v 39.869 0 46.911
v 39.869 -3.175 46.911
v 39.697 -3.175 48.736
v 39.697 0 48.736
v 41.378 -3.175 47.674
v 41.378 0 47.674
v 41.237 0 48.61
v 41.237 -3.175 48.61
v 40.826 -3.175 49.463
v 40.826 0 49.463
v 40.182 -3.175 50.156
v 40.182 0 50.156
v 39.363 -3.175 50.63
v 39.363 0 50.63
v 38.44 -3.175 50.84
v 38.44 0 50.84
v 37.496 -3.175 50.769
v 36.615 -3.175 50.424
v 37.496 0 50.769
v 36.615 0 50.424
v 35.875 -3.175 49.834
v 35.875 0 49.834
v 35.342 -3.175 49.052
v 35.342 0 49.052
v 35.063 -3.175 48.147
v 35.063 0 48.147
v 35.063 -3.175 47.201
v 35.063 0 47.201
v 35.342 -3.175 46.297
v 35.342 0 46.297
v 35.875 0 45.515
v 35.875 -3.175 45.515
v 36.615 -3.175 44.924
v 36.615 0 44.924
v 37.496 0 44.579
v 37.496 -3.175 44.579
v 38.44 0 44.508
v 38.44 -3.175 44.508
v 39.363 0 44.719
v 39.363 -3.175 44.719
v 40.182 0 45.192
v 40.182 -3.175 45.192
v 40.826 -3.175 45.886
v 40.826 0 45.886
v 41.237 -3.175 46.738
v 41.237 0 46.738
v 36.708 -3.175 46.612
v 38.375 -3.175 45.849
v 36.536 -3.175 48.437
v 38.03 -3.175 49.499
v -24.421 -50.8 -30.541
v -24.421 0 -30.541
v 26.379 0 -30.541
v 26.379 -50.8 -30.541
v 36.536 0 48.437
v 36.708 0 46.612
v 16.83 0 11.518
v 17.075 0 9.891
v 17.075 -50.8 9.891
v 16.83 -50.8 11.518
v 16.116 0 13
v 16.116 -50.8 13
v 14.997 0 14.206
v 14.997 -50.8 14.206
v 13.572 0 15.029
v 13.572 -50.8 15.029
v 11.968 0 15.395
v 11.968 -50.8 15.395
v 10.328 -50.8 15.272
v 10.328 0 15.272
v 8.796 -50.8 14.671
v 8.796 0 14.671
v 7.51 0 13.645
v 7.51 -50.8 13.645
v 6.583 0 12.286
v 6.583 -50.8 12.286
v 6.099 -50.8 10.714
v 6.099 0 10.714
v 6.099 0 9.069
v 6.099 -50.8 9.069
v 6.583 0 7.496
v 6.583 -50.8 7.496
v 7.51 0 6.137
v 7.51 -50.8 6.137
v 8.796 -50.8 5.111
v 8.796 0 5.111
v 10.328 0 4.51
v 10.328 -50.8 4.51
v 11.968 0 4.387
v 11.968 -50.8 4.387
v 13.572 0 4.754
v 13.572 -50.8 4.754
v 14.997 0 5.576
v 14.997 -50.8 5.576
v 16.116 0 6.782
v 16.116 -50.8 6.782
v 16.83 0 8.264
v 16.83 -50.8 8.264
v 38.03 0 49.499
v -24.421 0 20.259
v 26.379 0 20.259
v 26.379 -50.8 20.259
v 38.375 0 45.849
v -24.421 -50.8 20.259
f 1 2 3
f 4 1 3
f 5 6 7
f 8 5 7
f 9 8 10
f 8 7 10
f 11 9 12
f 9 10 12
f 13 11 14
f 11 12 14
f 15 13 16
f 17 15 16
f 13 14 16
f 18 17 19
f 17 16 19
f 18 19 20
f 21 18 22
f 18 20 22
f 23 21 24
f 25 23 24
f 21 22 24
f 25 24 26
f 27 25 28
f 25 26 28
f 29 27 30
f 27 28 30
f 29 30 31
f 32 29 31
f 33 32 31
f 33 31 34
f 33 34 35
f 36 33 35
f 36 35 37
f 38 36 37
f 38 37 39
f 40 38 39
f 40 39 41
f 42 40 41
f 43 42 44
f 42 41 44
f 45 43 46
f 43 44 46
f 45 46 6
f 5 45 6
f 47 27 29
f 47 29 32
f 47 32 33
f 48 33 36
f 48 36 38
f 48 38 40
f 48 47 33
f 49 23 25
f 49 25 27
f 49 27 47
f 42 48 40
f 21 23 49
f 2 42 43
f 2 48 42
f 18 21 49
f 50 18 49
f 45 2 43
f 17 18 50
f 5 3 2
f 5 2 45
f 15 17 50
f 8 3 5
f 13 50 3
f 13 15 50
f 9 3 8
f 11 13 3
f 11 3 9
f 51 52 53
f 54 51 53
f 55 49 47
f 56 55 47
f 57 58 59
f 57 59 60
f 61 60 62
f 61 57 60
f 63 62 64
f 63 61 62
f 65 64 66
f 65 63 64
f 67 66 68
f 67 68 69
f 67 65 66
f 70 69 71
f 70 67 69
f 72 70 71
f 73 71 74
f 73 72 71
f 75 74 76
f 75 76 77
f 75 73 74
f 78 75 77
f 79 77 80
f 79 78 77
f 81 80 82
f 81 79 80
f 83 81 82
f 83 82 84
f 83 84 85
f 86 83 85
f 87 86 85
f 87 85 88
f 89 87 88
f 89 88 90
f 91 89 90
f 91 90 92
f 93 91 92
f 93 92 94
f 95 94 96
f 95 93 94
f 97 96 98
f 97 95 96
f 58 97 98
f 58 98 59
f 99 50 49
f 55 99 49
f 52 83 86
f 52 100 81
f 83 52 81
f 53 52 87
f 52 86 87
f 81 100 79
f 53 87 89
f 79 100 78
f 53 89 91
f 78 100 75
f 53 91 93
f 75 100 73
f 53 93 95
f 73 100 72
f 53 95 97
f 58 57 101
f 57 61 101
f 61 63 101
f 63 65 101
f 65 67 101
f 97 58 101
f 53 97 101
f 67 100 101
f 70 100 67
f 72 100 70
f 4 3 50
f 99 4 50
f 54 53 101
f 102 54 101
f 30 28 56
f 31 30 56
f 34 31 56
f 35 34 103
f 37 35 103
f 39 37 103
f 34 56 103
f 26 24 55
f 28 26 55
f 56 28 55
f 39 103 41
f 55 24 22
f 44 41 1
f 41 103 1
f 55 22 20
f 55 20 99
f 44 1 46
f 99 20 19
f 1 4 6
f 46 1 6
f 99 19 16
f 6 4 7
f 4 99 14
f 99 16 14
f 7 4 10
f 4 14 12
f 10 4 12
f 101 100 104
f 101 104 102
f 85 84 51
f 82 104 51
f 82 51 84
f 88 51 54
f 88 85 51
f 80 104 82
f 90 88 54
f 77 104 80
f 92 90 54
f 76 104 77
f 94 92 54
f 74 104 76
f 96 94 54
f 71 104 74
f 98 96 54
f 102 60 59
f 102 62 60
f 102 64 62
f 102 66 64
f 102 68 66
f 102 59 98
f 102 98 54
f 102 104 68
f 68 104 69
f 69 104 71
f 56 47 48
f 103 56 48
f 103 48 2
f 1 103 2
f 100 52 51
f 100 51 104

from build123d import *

# Parameters (mm, degrees)
F0_W     = 50.8
F0_H     = 50.8
F1_DEPTH = 50.8
F2_R     = 5.519028
F3_DEPTH = 50.8
F4_R     = 3.175
F5_DEPTH = 3.175
F7_DEPTH = 3.175


with BuildPart() as f1:
    # F0 (on Front) → F1 (new body)
    with BuildSketch(Plane.XZ):
        with Locations((0.979315, -5.141297)):
            Rectangle(F0_W, F0_H)
    extrude(amount=F1_DEPTH)

    # F2 (on face) → F3 (cut)
    with BuildSketch(Plane.XZ):
        with Locations((11.555911, 9.891078)):
            Circle(F2_R)
    extrude(amount=F3_DEPTH, mode=Mode.SUBTRACT)


with BuildPart() as f5:
    # F4 (on Front) → F5 (new body)
    with BuildSketch(Plane.XZ):
        with Locations((38.20262, 47.674084)):
            Circle(F4_R)
    extrude(amount=F5_DEPTH)

    # F6 (on face) → F7 (cut)
    with BuildSketch(Plane.XZ.offset(3.175)):
        Polygon((38.374963, 45.849116), (39.86926, 46.910853), (39.696918, 48.73582), (38.030278, 49.499052), (36.535981, 48.437315), (36.708323, 46.612348), align=None)
    extrude(amount=-F7_DEPTH, mode=Mode.SUBTRACT)


solid = Compound([f1.part, f5.part])
